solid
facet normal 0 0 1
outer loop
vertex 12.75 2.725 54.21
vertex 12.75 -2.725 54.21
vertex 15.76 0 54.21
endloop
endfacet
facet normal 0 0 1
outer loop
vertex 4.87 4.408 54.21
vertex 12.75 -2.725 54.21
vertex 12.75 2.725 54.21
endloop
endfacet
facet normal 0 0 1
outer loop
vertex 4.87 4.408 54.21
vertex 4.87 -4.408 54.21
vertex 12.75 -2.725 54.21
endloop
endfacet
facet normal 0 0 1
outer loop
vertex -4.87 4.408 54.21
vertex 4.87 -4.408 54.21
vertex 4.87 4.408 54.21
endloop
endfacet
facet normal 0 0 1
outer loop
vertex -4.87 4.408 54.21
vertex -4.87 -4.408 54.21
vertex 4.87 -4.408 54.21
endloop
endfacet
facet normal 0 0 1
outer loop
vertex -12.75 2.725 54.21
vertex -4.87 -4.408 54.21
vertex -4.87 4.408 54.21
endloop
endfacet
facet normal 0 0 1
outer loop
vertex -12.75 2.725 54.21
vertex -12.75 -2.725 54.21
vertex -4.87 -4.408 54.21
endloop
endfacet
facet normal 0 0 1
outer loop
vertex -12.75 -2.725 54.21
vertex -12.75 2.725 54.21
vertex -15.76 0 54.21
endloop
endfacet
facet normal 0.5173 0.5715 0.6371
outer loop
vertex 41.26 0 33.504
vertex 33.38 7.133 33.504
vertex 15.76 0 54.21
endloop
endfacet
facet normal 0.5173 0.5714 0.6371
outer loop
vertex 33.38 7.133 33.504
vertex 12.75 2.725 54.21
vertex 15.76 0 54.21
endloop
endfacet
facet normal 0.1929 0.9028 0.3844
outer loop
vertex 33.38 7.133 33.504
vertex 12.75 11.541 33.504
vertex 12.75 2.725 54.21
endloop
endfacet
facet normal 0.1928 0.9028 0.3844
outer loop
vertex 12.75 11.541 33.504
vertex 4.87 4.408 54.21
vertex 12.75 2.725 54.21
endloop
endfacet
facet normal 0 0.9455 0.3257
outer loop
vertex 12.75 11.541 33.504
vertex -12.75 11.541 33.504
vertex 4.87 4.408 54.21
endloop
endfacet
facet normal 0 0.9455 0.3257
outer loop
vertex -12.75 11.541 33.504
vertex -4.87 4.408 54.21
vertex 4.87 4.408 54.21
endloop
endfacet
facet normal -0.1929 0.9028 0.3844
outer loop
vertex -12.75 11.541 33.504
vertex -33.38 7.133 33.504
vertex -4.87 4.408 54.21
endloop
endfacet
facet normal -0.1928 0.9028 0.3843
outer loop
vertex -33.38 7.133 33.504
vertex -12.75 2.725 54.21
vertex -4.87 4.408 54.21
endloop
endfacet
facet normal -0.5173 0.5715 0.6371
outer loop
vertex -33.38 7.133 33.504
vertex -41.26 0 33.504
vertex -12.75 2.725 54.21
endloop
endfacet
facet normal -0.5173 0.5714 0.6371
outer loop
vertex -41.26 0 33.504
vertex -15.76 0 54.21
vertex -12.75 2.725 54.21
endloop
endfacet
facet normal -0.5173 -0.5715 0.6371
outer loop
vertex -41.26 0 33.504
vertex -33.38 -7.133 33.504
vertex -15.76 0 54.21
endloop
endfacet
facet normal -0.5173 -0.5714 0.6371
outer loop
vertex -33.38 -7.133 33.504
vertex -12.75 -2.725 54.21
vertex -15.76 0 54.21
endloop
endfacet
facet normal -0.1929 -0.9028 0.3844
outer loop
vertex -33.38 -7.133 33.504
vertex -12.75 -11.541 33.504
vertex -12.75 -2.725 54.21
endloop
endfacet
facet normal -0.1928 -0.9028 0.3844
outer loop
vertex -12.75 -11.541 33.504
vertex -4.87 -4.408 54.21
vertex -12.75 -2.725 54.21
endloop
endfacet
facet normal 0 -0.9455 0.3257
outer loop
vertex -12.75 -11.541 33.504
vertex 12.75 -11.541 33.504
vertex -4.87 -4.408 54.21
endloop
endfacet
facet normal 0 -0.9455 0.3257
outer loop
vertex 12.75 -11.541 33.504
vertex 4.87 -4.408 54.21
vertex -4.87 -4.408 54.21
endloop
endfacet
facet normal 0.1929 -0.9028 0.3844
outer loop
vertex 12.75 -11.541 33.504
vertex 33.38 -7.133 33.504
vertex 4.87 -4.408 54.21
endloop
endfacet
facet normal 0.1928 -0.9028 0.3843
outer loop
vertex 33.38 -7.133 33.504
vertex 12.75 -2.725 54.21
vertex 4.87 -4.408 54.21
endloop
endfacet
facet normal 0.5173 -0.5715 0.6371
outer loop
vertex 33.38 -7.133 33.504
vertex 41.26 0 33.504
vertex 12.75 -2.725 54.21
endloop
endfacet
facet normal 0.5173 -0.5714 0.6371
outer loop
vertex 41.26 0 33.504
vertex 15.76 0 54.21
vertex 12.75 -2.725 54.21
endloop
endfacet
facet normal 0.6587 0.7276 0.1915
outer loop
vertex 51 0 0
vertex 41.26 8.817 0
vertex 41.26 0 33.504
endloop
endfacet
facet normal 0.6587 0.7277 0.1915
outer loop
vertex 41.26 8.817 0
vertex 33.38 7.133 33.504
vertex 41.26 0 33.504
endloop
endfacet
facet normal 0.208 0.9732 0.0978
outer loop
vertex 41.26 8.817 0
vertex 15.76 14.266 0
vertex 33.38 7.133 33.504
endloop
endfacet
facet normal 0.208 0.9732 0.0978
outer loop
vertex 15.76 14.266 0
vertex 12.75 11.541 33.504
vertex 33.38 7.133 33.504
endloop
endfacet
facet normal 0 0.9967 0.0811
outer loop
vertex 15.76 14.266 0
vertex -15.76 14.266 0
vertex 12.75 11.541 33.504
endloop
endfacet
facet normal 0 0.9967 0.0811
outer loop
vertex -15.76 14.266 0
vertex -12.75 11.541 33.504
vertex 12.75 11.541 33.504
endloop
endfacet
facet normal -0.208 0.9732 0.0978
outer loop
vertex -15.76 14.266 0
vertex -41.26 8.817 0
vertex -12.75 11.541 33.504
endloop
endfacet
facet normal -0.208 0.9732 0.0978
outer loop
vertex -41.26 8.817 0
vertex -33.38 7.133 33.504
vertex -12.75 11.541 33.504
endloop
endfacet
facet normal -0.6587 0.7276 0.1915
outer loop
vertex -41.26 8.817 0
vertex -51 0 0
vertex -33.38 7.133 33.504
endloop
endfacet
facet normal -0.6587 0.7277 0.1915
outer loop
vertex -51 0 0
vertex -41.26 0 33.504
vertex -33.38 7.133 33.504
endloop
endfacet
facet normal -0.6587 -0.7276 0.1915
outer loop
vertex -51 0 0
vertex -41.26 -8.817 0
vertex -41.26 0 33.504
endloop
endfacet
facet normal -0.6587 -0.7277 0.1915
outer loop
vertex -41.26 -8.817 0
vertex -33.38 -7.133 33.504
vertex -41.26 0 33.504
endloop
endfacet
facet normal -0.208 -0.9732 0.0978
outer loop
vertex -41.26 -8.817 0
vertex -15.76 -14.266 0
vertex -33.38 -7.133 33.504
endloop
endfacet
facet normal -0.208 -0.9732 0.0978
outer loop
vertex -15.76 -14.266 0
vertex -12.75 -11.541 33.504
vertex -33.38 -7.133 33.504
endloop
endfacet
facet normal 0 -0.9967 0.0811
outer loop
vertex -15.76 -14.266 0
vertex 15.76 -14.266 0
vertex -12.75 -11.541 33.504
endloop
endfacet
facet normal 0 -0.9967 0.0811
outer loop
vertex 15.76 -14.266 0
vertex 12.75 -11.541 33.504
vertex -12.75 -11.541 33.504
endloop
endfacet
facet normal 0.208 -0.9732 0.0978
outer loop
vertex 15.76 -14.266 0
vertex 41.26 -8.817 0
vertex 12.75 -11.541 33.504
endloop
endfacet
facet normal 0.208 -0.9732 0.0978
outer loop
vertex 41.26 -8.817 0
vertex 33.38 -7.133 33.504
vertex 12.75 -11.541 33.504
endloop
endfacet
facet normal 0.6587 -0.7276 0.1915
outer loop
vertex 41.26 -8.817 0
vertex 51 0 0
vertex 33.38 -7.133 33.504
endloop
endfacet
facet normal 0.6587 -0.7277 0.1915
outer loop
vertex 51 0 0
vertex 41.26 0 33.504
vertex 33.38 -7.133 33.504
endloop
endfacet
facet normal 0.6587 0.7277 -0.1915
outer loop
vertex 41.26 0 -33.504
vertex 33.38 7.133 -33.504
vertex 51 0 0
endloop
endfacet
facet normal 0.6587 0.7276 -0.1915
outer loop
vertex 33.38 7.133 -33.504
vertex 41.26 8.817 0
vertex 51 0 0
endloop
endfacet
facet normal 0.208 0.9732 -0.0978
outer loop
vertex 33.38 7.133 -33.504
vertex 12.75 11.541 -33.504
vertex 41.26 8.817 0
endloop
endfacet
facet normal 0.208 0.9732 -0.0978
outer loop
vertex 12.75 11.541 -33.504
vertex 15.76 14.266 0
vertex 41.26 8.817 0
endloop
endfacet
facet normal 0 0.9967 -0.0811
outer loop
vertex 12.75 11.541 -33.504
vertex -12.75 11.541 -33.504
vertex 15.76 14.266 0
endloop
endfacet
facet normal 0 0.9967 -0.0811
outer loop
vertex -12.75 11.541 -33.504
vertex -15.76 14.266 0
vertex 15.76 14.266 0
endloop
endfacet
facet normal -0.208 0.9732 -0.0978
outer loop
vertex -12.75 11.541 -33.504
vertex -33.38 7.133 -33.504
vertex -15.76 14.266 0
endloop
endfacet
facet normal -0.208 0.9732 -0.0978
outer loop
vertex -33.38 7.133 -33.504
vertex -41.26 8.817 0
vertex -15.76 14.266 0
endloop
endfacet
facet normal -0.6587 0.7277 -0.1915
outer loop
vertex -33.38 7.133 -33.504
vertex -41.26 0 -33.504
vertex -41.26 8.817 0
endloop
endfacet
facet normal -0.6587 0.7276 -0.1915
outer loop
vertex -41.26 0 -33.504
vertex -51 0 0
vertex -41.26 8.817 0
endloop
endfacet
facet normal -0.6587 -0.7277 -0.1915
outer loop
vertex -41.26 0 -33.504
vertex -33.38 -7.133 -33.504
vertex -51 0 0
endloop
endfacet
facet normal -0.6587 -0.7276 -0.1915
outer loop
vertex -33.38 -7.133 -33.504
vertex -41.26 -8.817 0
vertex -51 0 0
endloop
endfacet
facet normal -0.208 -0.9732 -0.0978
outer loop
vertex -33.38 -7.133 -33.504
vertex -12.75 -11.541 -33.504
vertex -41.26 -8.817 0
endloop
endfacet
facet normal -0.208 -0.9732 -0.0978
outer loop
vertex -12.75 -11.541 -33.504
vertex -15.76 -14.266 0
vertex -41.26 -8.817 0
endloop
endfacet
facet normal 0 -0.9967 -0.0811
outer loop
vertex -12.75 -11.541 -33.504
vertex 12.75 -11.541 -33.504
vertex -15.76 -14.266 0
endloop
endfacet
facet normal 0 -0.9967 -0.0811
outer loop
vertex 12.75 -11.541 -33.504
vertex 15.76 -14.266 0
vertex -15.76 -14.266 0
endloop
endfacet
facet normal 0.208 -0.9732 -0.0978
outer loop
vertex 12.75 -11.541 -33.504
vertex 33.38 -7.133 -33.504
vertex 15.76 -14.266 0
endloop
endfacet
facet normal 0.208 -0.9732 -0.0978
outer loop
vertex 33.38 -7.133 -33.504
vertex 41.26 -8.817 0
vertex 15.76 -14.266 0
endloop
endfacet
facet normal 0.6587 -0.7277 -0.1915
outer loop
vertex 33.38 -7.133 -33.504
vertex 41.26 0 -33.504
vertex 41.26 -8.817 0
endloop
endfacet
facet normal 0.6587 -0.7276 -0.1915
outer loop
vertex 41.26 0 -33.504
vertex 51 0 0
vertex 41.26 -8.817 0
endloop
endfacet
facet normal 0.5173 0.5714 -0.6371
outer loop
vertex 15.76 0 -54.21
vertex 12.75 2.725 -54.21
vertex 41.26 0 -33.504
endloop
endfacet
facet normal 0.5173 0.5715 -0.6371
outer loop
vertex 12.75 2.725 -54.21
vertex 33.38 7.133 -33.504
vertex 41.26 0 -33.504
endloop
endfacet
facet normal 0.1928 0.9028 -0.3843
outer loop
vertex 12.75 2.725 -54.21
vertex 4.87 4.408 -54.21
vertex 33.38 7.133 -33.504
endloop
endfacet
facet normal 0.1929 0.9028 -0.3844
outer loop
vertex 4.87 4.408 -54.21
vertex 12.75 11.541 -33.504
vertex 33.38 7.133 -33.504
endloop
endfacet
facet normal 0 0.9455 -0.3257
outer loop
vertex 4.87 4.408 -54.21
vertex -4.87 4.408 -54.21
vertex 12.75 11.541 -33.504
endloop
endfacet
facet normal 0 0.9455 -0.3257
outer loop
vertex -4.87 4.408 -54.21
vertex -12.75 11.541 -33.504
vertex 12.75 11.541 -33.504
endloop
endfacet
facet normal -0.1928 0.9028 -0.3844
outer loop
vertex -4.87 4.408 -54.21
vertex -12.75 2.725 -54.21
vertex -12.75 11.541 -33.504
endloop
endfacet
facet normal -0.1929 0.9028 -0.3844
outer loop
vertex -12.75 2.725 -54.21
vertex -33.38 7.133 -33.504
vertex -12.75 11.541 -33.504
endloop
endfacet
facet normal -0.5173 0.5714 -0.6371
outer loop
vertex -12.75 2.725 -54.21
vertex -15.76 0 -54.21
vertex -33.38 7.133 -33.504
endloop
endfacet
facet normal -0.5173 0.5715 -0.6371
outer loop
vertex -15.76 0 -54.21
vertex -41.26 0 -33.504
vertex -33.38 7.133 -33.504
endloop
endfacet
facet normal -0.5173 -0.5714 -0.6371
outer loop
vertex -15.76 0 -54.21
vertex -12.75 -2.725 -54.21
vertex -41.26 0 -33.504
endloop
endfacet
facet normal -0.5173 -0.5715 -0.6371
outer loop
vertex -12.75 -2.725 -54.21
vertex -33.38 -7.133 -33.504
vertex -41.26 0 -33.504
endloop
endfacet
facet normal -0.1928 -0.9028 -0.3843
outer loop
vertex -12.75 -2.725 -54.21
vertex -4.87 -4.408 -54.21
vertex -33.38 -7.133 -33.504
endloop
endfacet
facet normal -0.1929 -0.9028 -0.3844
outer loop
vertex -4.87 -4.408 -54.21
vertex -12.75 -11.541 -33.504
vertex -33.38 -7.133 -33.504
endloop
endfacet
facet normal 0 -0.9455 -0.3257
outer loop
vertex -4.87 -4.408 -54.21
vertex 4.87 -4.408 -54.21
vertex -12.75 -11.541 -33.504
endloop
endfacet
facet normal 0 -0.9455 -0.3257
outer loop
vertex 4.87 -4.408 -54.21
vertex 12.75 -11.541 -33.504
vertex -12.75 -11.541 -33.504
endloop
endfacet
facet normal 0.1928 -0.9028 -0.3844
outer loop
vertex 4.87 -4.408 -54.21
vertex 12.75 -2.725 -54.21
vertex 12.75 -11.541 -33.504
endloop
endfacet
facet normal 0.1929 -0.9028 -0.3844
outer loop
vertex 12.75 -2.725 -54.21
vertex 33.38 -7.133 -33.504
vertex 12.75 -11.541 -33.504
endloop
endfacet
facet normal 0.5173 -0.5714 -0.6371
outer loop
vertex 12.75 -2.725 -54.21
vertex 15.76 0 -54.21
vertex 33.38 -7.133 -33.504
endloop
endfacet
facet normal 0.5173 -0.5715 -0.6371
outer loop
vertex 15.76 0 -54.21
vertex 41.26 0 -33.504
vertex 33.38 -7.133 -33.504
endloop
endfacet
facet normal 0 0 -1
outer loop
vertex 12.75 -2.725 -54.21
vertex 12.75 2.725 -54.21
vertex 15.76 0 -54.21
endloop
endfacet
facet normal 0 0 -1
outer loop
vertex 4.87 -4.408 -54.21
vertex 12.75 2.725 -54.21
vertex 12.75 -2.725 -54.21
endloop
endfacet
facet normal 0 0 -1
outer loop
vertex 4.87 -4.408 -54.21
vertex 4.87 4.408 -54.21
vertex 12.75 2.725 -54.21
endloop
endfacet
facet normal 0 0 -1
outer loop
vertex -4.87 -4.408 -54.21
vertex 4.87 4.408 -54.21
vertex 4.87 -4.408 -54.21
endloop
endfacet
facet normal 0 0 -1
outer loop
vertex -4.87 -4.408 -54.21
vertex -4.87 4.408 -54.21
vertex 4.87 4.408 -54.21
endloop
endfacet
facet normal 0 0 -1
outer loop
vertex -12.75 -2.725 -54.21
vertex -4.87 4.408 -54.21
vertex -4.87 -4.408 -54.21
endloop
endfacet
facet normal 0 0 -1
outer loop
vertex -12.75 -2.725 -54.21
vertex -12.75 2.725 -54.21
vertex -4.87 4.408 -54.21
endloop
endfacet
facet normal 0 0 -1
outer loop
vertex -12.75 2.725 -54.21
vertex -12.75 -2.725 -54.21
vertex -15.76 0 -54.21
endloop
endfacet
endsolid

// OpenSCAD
// Generated by SolidPython 1.0.1 on 2020-07-29 00:46:52


scale(v = [17, 5, 19]) {
	sphere(r = 3);
}
/***********************************************
*********      SolidPython code:      **********
************************************************
 
# import packages: SolidPython
from solid import *
from solid.utils import *
from itertools import chain, combinations, permutations


class Resize:

    def __init__(self, scad_file):
        self.scad_file = scad_file
        #self.scad_file = import_scad(scad_file)
        # cone/cylinder param:
        self.r1 = 0
        self.r2 = 0
        self.h = 0
        # rectangular prism param:
        self.w = 0
        self.l = 0
        # ellipse param:
        self.r = 0

    # import OpenScad code (file name corresponds to shape)


    # classify shape + parameters
    def assign(self, param1, param2, param3):
        if self.scad_file == 'cone.scad':
            self.r1 = param1
            self.r2 = param2
            self.h = param3
        elif self.scad_file == 'cylinder.scad':
            self.r1 = param1
            self.r2 = param2
            self.h = param3
        elif self.scad_file == 'rectangularPrism.scad':
            self.h = param1
            self.l = param2
            self.w = param3
        else:
            self.r = param1
            self.h = param2

    # resize parameters
    def iterate(self):
        x = range(3, 20, 2)
        i = 1
        if self.scad_file == 'cone.scad':
            tempList = list(permutations(x, 2))
            for temp in tempList:
                param1 = temp[0]
                param2 = temp[1]
                filepath = 'produced_scad_files/' + 'cone' + str(param1) + '_' + str(param2) + '_' + '.scad'
                scad_render_to_file(cylinder(h=param1, r1=param2, r2=0), filepath)

        elif self.scad_file == 'cylinder.scad':
            tempList = list(permutations(x, 3))
            for temp in tempList:
                param1 = temp[0]
                param2 = temp[1]
                filepath = 'produced_scad_files/' + 'cylinder' + str(param1) + '_' + str(param2) + '_' + '.scad'
                scad_render_to_file(cylinder(h=param1, r1=param2, r2=param2), filepath)

        elif self.scad_file == 'rectangularPrism.scad':
            tempList = list(permutations(x, 3))
            for temp in tempList:
                param1 = temp[0]
                param2 = temp[1]
                param3 = temp[2]
                filepath = 'produced_scad_files/' + 'rectangularPrism' + str(param1) + '_' + str(param2) + '_' + str(
                    param3) + '.scad'
                scad_render_to_file(cube(size=(param1, param2, param3)), filepath)

        elif self.scad_file == 'ellipse.scad':
            tempList = list(permutations(x, 4))
            for temp in tempList:
                param1 = temp[0]
                param2 = temp[1]
                param3 = temp[2]
                param4 = temp[3]
                filepath = 'produced_scad_files/' + 'ellipse' + str(param1) + '_' + str(param2) + '_' + str(param3) + '_' + str(param4) + '.scad'
                scad_render_to_file(scale([param1, param2, param3])(sphere(r=param4)), filepath)

    def render_to_scadfile(self):
        scad_render_to_file(scad, 'example.scad') 
 
************************************************/
